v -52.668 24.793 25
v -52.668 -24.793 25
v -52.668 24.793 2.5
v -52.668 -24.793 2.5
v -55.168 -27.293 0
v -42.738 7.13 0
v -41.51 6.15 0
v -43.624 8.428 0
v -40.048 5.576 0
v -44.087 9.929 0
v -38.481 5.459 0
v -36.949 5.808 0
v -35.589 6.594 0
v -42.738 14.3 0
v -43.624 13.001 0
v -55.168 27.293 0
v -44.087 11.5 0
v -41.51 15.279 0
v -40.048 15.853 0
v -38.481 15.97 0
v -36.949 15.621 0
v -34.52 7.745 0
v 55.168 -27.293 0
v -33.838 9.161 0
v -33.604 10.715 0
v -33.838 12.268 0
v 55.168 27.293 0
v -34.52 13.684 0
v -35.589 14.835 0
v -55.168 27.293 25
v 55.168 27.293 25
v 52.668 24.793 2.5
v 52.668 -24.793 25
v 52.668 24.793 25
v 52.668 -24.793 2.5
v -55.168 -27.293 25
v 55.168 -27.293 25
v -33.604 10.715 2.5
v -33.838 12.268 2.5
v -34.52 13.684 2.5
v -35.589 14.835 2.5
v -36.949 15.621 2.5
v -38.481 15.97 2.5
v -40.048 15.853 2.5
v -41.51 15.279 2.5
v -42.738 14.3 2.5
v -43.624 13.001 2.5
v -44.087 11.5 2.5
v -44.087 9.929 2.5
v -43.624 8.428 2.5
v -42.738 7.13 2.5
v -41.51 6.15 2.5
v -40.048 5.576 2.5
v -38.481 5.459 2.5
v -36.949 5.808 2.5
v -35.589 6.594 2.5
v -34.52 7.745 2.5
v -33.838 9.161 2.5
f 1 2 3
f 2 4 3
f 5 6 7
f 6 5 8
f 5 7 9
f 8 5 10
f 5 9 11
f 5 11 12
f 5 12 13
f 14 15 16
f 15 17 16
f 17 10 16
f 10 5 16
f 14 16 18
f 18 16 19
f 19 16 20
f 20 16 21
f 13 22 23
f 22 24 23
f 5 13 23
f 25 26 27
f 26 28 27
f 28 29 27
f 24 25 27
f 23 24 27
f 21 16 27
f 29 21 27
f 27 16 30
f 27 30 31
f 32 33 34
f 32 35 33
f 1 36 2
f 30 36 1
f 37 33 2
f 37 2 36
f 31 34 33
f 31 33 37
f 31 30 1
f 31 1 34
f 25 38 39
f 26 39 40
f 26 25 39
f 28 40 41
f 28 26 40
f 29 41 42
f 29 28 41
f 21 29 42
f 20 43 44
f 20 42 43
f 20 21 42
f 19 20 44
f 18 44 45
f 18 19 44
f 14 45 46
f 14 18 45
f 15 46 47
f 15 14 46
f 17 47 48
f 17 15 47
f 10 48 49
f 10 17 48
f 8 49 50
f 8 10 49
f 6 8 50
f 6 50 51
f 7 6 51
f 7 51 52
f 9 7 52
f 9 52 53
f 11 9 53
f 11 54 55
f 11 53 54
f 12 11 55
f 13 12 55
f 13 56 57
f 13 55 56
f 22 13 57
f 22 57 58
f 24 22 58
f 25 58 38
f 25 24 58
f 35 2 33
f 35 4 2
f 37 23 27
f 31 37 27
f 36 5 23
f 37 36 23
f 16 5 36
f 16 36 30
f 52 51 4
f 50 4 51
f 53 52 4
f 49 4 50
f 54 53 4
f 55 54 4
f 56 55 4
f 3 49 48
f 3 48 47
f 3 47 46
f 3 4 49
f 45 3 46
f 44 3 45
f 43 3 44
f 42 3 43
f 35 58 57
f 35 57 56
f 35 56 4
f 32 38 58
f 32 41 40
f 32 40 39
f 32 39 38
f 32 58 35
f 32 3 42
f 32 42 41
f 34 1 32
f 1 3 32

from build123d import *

# Parameters (mm, degrees)
F0_W     = 110.33576
F0_H     = 54.586928
F1_DEPTH = 25
F2_T     = -2.5
F3_R     = 5.270702
F4_DEPTH = 25.001


with BuildPart() as f1:
    # F0 (on Top) → F1 (new body)
    with BuildSketch(Plane.XY):
        Rectangle(F0_W, F0_H)
    extrude(amount=F1_DEPTH)

    # F2
    f2_openings = [f1.faces().sort_by_distance(p)[0] for p in [
        (0, 0, 25),
    ]]
    offset(amount=F2_T, openings=f2_openings)

    # F3 (on Top) → F4 (cut, through all)
    with BuildSketch(Plane.XY):
        with Locations((-38.874775, 10.714518)):
            Circle(F3_R)
    extrude(amount=F4_DEPTH, mode=Mode.SUBTRACT)


solid = f1.part
